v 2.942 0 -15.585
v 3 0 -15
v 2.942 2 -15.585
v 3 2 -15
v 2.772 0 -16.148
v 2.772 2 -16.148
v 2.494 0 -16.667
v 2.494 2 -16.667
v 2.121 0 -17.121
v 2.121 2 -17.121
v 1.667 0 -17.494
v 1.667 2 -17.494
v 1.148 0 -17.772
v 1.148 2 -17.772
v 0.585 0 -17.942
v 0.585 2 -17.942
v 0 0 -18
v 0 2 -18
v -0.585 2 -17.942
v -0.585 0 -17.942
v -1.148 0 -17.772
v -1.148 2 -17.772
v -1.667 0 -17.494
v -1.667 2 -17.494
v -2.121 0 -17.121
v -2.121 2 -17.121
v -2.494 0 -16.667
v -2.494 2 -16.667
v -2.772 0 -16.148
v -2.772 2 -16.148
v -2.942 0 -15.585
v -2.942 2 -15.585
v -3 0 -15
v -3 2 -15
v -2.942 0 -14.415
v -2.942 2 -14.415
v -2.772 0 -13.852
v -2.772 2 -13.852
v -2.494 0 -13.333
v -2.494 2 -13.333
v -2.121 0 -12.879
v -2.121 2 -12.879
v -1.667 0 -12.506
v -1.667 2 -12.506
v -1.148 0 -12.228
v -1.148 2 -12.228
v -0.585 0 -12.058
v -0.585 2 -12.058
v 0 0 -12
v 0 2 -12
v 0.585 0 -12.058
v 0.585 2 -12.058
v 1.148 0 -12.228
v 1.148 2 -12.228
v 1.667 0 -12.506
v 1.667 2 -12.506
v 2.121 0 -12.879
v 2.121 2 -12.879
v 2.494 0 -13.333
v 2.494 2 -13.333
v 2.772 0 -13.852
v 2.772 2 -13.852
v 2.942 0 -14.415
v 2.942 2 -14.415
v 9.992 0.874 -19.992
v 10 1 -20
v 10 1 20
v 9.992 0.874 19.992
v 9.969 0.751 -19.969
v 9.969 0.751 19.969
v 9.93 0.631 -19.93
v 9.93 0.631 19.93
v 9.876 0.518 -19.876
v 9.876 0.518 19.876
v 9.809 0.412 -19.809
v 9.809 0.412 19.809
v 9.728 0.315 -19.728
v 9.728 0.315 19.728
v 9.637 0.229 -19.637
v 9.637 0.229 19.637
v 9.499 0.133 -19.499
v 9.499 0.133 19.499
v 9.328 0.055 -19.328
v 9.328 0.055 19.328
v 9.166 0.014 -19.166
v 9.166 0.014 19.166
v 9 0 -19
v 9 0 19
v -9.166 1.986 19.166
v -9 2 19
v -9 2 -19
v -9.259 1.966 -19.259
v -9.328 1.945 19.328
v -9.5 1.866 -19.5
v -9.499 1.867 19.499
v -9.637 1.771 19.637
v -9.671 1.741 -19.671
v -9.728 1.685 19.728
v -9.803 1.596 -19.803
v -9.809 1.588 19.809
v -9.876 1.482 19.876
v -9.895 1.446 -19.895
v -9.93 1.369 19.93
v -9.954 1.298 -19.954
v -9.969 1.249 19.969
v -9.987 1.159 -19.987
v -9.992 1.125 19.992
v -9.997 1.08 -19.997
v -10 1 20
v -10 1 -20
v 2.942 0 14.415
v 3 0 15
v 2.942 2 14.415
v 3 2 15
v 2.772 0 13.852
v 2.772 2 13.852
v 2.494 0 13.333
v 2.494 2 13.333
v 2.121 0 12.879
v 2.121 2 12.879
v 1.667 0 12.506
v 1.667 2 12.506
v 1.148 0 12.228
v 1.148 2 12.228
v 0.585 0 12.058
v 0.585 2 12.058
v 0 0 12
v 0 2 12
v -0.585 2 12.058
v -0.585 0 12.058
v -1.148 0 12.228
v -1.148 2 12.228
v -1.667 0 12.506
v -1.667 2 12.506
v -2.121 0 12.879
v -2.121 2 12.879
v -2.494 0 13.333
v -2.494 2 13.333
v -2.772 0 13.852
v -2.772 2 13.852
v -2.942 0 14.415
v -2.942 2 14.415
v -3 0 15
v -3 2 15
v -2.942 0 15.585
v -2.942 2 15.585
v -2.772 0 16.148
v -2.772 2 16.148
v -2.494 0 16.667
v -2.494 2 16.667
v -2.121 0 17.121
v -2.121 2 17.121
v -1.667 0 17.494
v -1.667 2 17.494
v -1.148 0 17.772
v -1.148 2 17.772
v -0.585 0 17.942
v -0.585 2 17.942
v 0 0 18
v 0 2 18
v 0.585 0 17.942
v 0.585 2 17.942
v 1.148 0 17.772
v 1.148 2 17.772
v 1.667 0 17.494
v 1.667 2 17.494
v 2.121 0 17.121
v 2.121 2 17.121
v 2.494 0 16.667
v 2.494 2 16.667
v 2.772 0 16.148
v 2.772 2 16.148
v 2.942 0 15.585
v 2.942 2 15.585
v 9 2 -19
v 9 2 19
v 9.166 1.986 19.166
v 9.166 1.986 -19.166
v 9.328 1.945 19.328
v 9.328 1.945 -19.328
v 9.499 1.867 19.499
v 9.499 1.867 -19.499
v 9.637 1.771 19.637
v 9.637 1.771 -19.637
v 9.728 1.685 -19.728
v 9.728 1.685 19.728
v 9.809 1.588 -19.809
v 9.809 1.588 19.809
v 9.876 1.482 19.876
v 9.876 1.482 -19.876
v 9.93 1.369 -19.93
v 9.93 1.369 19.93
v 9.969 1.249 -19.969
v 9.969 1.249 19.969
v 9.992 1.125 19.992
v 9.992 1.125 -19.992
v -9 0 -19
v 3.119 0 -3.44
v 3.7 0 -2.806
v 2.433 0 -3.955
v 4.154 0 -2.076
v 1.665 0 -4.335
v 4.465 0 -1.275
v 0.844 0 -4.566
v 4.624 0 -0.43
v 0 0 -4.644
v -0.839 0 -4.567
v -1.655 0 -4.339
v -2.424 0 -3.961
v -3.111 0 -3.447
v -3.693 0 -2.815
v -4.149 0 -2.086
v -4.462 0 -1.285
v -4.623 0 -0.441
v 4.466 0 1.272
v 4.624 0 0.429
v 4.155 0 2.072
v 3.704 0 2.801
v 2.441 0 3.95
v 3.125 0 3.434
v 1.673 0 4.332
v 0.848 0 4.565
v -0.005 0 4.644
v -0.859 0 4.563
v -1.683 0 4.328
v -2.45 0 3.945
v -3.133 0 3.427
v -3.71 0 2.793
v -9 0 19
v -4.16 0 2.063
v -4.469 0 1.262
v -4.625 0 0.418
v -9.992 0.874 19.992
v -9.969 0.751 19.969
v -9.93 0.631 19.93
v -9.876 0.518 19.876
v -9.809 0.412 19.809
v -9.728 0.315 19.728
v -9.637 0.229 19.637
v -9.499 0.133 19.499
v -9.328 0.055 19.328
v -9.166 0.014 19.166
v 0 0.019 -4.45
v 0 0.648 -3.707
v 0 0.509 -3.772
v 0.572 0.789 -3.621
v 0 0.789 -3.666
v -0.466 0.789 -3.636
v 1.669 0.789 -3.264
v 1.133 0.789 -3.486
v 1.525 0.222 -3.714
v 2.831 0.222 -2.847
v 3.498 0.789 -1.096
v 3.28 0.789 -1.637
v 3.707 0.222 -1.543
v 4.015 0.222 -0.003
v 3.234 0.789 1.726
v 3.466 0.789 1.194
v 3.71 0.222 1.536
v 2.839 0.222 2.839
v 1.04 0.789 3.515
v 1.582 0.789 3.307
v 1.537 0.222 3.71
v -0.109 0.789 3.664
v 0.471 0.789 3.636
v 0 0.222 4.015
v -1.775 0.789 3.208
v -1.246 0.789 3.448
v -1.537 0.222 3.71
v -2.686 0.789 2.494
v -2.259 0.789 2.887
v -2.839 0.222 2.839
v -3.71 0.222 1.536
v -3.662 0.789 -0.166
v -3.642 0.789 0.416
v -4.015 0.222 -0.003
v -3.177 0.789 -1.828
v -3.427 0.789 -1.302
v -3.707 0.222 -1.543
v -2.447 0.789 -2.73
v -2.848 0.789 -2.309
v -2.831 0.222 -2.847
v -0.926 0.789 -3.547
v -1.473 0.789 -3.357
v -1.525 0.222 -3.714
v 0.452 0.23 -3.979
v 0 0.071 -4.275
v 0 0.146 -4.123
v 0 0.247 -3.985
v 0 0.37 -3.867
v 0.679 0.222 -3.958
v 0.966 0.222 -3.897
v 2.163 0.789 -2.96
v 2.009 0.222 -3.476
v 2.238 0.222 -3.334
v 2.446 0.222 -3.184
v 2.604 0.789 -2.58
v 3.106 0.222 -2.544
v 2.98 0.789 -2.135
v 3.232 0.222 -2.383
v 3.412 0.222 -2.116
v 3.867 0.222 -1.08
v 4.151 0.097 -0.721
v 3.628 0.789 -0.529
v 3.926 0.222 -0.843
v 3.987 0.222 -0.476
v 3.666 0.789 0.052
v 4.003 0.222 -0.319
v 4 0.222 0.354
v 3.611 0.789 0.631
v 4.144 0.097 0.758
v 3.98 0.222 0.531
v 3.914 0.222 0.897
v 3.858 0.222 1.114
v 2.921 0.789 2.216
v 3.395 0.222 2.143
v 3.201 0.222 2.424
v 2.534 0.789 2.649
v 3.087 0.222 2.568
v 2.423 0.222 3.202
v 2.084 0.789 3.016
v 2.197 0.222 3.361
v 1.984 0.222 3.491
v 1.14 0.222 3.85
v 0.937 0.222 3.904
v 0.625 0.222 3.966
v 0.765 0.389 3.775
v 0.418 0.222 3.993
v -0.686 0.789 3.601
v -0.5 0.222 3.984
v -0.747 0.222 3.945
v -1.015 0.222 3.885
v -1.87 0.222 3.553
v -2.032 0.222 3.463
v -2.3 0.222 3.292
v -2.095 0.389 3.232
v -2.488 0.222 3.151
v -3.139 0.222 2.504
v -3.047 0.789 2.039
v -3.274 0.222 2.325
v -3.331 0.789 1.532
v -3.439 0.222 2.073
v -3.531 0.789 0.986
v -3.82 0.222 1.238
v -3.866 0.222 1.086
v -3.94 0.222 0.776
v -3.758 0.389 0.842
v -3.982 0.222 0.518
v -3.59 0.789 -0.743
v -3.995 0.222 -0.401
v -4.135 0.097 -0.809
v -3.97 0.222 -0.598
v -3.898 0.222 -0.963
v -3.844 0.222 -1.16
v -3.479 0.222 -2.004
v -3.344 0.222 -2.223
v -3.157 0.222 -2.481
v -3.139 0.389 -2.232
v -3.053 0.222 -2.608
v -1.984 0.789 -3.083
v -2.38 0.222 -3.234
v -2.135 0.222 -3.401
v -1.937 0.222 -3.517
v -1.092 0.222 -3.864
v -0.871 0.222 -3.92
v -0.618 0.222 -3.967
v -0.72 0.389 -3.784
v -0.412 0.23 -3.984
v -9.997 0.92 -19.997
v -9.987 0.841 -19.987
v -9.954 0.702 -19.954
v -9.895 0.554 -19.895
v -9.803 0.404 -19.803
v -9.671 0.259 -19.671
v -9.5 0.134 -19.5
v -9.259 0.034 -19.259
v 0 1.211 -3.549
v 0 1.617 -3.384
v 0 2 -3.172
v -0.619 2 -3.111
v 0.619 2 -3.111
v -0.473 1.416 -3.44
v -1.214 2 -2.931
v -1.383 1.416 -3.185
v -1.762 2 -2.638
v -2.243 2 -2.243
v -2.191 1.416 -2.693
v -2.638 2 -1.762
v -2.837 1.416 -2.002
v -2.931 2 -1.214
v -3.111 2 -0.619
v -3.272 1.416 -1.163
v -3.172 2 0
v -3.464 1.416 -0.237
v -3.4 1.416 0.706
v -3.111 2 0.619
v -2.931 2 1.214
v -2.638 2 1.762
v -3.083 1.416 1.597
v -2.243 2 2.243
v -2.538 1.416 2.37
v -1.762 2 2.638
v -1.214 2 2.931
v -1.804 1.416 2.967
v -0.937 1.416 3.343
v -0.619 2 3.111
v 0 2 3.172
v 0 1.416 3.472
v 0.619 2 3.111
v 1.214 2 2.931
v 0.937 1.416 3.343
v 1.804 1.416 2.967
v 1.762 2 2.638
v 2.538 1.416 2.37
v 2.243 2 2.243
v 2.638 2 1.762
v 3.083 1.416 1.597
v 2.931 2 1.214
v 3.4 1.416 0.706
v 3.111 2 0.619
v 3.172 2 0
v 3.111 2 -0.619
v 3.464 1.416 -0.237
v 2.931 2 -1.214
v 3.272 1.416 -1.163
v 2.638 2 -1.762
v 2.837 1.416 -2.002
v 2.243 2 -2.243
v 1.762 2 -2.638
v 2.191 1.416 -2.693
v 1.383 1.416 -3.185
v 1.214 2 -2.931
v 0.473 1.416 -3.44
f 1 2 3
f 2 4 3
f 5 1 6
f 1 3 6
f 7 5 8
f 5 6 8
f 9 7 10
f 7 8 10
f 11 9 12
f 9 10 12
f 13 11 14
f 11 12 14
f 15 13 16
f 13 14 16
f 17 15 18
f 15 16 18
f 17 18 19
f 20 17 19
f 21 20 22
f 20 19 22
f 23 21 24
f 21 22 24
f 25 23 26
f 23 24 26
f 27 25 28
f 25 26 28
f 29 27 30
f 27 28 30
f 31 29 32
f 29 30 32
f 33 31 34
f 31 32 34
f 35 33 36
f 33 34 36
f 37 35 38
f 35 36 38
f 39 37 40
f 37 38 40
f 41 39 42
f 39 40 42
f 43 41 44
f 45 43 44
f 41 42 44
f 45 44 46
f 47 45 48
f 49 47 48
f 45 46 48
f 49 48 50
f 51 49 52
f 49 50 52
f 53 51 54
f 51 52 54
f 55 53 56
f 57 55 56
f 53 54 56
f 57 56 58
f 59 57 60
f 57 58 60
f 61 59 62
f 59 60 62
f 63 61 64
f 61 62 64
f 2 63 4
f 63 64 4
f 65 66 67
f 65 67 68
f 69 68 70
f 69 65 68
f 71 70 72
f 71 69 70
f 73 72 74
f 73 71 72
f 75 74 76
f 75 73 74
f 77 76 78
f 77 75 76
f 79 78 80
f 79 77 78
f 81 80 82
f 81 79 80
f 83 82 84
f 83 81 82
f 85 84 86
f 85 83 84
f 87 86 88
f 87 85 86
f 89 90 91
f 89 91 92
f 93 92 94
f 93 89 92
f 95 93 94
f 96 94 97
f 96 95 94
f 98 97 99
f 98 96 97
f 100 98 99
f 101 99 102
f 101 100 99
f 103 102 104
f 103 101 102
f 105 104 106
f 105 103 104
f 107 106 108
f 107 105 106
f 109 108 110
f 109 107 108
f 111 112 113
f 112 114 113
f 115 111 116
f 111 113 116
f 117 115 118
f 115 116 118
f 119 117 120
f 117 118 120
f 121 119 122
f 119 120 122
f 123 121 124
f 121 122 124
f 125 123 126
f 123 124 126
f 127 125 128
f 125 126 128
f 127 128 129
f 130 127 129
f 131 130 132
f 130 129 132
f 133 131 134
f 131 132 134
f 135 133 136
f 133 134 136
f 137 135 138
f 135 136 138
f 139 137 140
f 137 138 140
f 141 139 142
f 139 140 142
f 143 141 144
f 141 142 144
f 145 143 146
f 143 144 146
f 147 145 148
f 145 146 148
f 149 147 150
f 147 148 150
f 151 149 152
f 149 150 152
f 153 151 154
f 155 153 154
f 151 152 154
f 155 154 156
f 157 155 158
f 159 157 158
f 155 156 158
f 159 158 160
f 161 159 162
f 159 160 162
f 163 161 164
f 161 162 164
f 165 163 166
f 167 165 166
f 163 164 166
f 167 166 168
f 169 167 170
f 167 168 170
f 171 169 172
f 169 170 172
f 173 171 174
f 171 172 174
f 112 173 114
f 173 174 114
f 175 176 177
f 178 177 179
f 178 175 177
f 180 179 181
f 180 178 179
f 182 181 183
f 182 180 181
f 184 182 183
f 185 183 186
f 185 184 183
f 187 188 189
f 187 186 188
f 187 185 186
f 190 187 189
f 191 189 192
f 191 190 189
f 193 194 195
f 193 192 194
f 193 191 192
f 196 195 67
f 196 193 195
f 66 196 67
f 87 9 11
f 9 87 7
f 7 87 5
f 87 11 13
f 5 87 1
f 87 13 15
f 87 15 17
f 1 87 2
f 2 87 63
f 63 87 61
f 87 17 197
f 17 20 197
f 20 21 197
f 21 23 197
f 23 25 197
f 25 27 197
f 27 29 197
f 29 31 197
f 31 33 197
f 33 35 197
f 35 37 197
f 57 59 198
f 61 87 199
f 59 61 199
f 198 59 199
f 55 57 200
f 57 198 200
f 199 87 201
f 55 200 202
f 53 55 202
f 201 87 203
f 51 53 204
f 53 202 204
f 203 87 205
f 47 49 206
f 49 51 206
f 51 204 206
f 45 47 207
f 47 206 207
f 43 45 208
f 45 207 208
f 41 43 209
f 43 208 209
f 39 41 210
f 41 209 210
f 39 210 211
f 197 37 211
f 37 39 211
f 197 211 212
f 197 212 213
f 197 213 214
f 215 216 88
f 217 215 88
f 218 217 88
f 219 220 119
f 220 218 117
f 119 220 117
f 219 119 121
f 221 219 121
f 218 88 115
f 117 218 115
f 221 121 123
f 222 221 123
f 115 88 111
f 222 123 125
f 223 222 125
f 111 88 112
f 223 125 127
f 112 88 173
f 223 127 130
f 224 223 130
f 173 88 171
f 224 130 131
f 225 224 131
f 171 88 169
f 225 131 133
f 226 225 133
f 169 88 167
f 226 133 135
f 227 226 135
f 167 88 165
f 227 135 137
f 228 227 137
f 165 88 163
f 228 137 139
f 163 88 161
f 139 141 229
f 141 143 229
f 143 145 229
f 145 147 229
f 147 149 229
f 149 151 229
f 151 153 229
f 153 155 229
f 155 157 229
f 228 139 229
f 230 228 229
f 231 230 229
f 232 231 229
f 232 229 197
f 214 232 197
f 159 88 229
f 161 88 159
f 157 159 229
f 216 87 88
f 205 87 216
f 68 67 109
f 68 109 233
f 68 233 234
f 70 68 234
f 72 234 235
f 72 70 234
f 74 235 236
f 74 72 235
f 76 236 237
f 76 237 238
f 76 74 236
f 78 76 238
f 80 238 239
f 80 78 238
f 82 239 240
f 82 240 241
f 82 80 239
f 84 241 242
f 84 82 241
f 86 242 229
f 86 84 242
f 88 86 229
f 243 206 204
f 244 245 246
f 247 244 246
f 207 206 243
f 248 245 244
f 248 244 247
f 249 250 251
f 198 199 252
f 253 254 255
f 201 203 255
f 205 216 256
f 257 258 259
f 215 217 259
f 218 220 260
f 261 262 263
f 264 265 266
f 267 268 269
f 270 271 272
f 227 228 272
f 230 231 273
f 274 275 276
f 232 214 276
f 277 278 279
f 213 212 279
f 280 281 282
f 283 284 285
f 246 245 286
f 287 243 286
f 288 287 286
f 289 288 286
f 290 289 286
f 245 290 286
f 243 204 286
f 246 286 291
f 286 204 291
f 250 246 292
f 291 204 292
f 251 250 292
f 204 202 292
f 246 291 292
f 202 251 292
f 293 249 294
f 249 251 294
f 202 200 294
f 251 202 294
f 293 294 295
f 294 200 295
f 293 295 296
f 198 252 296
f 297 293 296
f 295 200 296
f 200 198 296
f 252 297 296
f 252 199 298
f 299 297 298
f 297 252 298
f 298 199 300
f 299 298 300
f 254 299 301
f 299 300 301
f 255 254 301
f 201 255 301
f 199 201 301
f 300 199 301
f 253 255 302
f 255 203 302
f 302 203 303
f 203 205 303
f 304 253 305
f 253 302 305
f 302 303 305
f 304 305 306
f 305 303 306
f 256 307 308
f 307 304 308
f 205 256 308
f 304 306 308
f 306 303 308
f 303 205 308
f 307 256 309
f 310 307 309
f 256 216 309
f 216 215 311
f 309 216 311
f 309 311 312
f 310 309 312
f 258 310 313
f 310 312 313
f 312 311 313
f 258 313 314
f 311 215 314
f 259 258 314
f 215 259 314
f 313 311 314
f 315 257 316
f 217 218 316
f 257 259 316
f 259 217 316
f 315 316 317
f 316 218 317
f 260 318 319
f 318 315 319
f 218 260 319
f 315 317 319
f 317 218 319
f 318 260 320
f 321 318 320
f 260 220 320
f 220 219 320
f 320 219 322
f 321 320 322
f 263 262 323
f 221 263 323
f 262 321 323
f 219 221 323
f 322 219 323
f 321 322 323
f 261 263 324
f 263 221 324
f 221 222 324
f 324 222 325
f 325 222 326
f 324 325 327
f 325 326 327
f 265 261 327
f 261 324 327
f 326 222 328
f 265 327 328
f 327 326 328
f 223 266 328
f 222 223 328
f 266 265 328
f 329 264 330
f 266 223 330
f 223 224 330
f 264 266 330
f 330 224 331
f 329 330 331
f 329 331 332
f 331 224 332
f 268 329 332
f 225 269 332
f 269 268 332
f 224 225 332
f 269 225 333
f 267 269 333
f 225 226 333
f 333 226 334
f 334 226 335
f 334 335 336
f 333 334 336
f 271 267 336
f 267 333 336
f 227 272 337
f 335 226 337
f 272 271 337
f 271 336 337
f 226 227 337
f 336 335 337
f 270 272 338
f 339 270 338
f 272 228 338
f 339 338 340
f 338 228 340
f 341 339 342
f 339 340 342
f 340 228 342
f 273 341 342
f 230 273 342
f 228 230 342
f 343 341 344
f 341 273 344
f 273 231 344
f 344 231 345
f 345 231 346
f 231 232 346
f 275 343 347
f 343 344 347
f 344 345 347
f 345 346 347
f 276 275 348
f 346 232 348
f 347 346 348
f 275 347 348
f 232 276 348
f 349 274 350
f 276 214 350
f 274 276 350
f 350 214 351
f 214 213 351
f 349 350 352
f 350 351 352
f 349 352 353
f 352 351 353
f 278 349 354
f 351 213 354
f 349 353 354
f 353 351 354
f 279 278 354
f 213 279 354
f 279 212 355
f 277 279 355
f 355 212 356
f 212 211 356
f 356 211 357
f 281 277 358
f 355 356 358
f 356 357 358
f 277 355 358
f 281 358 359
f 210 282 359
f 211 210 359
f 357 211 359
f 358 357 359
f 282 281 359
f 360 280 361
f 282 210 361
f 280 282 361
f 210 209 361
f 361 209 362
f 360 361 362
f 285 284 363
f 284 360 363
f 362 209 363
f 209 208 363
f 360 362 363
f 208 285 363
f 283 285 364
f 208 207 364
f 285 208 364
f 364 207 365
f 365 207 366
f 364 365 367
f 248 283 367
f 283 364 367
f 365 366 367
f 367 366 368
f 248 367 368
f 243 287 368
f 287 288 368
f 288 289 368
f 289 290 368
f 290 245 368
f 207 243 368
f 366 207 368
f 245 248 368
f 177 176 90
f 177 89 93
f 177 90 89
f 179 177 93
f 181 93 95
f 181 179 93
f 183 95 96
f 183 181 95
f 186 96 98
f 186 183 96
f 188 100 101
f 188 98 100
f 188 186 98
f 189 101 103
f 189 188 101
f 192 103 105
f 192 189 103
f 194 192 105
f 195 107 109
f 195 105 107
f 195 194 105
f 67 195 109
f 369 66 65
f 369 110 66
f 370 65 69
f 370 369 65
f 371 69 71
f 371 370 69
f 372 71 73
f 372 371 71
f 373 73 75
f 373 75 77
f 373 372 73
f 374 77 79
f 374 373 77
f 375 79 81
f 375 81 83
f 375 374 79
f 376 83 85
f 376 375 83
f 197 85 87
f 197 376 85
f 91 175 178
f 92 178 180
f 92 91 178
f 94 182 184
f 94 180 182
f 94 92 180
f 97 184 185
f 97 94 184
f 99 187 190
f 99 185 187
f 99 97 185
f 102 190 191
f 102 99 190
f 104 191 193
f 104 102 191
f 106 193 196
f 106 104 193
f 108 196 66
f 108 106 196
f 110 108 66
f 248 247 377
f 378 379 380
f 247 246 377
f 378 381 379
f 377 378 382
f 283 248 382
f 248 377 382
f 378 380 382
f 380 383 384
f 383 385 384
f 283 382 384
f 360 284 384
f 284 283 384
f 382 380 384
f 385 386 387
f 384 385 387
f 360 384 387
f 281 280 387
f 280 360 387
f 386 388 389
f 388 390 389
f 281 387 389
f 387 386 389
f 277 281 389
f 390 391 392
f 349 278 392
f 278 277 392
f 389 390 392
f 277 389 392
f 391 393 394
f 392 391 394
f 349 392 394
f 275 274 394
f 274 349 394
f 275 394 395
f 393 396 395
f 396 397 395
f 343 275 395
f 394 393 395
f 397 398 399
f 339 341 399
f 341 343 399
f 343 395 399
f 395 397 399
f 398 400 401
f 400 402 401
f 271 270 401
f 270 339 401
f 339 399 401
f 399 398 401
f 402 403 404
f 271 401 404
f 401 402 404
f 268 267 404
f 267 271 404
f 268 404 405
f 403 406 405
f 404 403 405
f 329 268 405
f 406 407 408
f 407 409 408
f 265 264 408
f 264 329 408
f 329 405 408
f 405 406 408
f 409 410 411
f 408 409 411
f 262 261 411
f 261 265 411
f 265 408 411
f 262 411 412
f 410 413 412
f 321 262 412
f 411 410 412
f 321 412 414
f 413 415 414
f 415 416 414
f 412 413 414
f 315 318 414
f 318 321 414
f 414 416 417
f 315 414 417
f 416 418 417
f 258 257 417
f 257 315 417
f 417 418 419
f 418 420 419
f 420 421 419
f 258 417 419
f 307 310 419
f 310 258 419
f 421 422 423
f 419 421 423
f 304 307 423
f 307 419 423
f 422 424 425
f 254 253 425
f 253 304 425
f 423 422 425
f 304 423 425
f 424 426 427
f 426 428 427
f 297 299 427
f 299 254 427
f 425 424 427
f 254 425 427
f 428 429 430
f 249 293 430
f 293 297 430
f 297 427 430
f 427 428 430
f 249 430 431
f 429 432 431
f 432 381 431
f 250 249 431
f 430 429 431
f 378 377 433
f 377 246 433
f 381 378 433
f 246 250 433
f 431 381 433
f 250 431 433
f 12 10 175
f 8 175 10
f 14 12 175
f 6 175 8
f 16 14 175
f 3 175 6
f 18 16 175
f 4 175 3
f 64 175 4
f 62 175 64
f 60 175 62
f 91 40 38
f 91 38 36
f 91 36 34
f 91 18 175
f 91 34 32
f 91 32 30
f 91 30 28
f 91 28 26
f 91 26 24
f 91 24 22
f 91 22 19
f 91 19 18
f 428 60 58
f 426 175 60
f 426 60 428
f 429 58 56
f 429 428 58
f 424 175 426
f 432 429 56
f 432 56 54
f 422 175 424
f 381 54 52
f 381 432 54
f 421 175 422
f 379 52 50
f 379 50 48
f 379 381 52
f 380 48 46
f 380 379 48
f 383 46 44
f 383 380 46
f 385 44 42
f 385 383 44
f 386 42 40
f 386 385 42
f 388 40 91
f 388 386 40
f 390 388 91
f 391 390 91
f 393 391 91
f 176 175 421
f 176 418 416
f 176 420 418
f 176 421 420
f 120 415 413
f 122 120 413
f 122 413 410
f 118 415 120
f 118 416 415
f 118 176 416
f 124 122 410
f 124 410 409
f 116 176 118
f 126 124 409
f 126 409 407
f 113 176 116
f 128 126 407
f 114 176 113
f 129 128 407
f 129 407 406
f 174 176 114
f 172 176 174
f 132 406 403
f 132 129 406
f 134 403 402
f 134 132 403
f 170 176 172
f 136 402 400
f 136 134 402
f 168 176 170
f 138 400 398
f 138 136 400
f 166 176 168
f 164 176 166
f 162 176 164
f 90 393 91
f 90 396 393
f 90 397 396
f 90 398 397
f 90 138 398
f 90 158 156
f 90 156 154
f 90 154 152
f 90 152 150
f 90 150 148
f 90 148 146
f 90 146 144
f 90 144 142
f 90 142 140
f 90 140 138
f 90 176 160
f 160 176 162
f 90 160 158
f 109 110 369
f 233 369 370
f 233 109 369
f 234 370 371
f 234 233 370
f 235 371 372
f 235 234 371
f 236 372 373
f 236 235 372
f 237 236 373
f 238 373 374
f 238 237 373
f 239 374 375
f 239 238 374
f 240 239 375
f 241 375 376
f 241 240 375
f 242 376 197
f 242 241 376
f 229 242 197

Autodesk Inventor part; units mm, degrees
ref_plane "YZ Plane" through (0, 0, 0) normal (1, 0, 0) x (0, 1, 0)
ref_plane "XZ Plane" through (0, 0, 0) normal (0, 1, 0) x (-1, 0, 0)
sketch "Sketch1" plane through (0, 0, 0) normal (0, 1, 0) x (-1, 0, 0)
  line L0 (-10, -20) -> (10, -20)
  line L1 (10, -20) -> (10, 20)
  line L2 (10, 20) -> (-10, 20)
  line L3 (-10, 20) -> (-10, -20)
  line L4 (-10, -20) -> (10, 20) construction
  line L5 (10, -20) -> (-10, 20) construction
  point P0 (0, 0)
  dimension "d0" = 20
  dimension "d1" = 40
extrude "Extrusion1" add sketch "Sketch1" along normal blind 2
ref_plane "Work Plane1" through (0, 0, 20) normal (1, 0, 0) x (0, 0, -1)
sketch "Sketch3" plane through (0, 0, 20) normal (1, 0, 0) x (0, 0, -1)
  line L0 (40, 0) -> (40, 2) projected
  line L1 (40, 0) -> (20, 0)
  line L2 (40, 0) -> (0, 0) projected
  line L3 (20, 0) -> (20, -3.75)
  line L4 (20, 0) -> (23.75, 0) construction
  arc A0 (23.75, 0) -> (20, 3.75) centre (20, 0) ccw
  line L5 (20, 3.75) -> (20, 0)
  line L6 (20, 0) -> (23.75, 0)
  point P0 (20, 0)
  dimension "d5" = 20
  dimension "d6" = 3.75
  dimension "d7" = 90
  dimension "d8" = 3.75
revolve "Revolution1" cut sketch "Sketch3" angle 360 about axis through (0, 3.75, 0) along (0, -1, 0)
pattern_of_one "Rectangular Pattern1"
sketch "Sketch4" plane through (0, 2, 0) normal (0, 1, 0) x (1, 0, 0)
  line L0 (-10, -20) -> (10, -20) projected
  line L1 (0, -20) -> (0, -15)
  line L2 (10, 20) -> (-10, 20) projected
  line L3 (0, 20) -> (0, 15)
  circle A0 centre (0, -15) radius 3
  circle A1 centre (0, 15) radius 3
  point P0 (0, 0)
  dimension "d16" = 5
  dimension "d17" = 5
  dimension "d18" = 6
  dimension "d19" = 6
extrude "Extrusion2" cut sketch "Sketch4" against normal through all
fillet "Fillet1" radius 1 4 edges at (10, 2, 0) (0, 2, 20) (-10, 2, 0) (0, 2, -20)
fillet "Fillet2" radius 1 4 edges at (10, 0, 0) (0, 0, 20) (-10, 0, 0) (0, 0, -20)
fillet "Fillet3" radius 1 1 edges at (0, 0, 3.75)
properties part number "TestBearingTop"
